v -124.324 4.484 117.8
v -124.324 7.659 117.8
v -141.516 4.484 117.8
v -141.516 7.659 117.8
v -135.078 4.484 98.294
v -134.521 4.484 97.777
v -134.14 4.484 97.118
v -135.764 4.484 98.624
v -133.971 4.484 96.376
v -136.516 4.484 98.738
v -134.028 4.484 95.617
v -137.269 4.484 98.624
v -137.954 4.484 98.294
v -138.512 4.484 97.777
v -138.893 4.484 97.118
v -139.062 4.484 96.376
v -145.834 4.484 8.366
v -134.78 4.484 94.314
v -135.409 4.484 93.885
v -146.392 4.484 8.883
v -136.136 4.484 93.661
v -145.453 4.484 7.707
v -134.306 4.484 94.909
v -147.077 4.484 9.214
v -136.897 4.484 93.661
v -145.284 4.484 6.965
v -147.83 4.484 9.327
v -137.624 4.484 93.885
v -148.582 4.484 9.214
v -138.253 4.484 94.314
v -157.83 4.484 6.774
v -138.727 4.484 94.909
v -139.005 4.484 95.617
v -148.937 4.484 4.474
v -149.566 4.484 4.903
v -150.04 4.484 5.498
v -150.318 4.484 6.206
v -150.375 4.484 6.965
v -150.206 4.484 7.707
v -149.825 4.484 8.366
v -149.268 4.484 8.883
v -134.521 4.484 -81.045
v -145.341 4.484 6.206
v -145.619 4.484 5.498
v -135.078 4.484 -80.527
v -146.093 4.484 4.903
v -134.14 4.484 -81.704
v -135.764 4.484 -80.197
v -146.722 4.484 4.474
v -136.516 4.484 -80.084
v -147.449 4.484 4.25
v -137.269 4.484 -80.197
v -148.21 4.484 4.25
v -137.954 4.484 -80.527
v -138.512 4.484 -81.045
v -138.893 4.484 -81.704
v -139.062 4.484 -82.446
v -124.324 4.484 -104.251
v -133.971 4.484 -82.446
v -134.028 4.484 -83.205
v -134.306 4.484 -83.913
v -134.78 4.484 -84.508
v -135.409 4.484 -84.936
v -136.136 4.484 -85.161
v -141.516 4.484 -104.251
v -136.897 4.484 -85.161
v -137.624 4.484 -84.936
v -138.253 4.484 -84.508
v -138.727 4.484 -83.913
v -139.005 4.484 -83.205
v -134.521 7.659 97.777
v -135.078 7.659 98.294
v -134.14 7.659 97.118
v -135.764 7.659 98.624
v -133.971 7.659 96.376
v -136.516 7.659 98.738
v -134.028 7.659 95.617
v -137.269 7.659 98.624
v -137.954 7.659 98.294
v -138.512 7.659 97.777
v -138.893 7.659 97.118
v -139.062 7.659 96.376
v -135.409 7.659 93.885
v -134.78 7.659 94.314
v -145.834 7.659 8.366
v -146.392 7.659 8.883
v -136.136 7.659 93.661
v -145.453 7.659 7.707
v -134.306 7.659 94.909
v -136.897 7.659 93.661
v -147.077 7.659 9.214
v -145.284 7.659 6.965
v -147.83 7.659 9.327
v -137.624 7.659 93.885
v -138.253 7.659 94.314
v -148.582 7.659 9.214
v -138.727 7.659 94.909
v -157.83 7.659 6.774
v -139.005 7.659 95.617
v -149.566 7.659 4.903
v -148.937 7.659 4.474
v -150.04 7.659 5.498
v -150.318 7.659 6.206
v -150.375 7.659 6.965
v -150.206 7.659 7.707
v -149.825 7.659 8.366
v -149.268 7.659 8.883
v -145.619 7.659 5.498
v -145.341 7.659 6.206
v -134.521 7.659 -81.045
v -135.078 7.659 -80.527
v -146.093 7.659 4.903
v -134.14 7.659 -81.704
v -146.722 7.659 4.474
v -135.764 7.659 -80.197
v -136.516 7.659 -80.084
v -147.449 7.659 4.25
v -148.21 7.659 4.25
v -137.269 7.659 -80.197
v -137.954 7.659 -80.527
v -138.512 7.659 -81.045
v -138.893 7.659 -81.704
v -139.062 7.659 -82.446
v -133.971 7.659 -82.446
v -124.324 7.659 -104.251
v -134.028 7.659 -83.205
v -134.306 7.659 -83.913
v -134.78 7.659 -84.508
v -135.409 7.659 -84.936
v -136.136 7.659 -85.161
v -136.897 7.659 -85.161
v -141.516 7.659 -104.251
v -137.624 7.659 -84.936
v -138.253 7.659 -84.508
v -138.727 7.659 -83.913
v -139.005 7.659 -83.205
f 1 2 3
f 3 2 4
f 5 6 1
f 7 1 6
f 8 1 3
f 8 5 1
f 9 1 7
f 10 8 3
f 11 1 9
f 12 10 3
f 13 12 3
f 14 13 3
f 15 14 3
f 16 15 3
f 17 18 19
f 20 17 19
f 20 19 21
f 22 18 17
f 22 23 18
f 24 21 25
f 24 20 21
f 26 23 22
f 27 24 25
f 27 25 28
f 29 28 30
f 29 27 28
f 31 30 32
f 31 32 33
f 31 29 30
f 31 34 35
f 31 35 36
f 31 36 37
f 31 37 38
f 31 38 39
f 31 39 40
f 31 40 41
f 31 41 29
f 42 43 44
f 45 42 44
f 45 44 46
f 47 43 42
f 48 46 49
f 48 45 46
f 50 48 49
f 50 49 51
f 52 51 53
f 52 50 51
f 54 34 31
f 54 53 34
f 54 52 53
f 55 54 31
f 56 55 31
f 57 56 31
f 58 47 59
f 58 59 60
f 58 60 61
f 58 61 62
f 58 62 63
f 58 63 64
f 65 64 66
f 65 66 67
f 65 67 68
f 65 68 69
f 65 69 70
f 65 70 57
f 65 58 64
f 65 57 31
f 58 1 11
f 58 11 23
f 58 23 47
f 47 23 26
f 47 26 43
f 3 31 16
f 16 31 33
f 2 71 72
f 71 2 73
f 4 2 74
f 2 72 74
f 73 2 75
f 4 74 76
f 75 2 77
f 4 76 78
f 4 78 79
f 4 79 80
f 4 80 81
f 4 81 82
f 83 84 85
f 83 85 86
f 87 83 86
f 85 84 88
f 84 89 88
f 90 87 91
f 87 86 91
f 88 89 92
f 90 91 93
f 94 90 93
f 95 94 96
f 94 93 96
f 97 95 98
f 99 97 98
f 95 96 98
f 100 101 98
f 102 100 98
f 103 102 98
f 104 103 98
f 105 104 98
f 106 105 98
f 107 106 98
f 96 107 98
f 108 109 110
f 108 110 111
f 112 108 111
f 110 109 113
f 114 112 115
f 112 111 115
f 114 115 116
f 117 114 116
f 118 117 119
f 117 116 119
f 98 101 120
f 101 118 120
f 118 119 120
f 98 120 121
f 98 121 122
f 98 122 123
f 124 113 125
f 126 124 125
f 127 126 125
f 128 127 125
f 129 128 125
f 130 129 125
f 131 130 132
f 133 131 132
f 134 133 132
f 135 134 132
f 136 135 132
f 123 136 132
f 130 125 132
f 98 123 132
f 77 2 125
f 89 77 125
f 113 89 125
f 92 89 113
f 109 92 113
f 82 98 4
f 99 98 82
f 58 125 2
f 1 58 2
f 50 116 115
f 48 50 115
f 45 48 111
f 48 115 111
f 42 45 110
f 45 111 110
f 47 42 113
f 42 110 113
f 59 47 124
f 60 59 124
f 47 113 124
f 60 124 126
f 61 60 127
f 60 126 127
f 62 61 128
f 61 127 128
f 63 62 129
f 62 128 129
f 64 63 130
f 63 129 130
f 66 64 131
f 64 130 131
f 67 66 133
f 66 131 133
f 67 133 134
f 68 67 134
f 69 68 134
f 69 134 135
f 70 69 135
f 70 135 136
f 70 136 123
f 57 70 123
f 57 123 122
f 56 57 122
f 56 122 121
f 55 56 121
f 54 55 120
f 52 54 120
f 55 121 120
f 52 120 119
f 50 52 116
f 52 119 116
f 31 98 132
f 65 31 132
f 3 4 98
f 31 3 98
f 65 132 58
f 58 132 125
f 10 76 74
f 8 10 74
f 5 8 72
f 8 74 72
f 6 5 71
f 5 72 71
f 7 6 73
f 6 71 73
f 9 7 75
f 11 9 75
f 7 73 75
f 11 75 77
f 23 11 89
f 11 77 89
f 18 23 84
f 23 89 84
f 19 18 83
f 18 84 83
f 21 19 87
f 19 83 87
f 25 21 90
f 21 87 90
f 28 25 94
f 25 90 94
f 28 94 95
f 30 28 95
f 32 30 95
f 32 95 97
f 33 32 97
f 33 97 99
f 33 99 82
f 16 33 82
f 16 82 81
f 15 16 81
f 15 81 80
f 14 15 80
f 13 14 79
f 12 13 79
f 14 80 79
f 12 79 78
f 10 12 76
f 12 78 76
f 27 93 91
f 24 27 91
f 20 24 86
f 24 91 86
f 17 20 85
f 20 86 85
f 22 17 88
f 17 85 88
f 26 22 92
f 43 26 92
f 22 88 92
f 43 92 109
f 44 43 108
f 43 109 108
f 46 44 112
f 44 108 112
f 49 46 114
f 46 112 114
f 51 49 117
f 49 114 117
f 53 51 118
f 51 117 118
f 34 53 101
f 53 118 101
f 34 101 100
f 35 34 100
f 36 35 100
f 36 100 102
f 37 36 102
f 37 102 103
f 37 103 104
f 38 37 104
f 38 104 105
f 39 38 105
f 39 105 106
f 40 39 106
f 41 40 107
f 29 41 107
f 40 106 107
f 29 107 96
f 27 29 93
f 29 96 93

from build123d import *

# Parameters (mm, degrees)
SKETCH1_R           = 2.5527
BOSS_EXTRUDE1_DEPTH = 3.175


with BuildPart() as part:
    # Sketch1 → Boss-Extrude1 (new body)
    with BuildSketch(Plane(origin=(0, 7.659460084, 0), x_dir=(1, 0, 0), z_dir=(0, 1, 0))):
        Polygon((-141.5163305, 104.251042847), (-124.323681089, 104.251042847), (-124.323681089, -117.799669373), (-141.5163305, -117.799669373), (-157.82954988, -6.774313263), align=None)
        with Locations(Location((-136.5163305, -96.185148791, 0), (0, 0, 270))):
            Circle(SKETCH1_R, mode=Mode.SUBTRACT)
        with Locations(Location((-147.82954988, -6.774313263, 0), (0, 0, 270))):
            Circle(SKETCH1_R, mode=Mode.SUBTRACT)
        with Locations(Location((-136.5163305, 82.636522264, 0), (0, 0, 270))):
            Circle(SKETCH1_R, mode=Mode.SUBTRACT)
    extrude(amount=-BOSS_EXTRUDE1_DEPTH)


solid = part.part
